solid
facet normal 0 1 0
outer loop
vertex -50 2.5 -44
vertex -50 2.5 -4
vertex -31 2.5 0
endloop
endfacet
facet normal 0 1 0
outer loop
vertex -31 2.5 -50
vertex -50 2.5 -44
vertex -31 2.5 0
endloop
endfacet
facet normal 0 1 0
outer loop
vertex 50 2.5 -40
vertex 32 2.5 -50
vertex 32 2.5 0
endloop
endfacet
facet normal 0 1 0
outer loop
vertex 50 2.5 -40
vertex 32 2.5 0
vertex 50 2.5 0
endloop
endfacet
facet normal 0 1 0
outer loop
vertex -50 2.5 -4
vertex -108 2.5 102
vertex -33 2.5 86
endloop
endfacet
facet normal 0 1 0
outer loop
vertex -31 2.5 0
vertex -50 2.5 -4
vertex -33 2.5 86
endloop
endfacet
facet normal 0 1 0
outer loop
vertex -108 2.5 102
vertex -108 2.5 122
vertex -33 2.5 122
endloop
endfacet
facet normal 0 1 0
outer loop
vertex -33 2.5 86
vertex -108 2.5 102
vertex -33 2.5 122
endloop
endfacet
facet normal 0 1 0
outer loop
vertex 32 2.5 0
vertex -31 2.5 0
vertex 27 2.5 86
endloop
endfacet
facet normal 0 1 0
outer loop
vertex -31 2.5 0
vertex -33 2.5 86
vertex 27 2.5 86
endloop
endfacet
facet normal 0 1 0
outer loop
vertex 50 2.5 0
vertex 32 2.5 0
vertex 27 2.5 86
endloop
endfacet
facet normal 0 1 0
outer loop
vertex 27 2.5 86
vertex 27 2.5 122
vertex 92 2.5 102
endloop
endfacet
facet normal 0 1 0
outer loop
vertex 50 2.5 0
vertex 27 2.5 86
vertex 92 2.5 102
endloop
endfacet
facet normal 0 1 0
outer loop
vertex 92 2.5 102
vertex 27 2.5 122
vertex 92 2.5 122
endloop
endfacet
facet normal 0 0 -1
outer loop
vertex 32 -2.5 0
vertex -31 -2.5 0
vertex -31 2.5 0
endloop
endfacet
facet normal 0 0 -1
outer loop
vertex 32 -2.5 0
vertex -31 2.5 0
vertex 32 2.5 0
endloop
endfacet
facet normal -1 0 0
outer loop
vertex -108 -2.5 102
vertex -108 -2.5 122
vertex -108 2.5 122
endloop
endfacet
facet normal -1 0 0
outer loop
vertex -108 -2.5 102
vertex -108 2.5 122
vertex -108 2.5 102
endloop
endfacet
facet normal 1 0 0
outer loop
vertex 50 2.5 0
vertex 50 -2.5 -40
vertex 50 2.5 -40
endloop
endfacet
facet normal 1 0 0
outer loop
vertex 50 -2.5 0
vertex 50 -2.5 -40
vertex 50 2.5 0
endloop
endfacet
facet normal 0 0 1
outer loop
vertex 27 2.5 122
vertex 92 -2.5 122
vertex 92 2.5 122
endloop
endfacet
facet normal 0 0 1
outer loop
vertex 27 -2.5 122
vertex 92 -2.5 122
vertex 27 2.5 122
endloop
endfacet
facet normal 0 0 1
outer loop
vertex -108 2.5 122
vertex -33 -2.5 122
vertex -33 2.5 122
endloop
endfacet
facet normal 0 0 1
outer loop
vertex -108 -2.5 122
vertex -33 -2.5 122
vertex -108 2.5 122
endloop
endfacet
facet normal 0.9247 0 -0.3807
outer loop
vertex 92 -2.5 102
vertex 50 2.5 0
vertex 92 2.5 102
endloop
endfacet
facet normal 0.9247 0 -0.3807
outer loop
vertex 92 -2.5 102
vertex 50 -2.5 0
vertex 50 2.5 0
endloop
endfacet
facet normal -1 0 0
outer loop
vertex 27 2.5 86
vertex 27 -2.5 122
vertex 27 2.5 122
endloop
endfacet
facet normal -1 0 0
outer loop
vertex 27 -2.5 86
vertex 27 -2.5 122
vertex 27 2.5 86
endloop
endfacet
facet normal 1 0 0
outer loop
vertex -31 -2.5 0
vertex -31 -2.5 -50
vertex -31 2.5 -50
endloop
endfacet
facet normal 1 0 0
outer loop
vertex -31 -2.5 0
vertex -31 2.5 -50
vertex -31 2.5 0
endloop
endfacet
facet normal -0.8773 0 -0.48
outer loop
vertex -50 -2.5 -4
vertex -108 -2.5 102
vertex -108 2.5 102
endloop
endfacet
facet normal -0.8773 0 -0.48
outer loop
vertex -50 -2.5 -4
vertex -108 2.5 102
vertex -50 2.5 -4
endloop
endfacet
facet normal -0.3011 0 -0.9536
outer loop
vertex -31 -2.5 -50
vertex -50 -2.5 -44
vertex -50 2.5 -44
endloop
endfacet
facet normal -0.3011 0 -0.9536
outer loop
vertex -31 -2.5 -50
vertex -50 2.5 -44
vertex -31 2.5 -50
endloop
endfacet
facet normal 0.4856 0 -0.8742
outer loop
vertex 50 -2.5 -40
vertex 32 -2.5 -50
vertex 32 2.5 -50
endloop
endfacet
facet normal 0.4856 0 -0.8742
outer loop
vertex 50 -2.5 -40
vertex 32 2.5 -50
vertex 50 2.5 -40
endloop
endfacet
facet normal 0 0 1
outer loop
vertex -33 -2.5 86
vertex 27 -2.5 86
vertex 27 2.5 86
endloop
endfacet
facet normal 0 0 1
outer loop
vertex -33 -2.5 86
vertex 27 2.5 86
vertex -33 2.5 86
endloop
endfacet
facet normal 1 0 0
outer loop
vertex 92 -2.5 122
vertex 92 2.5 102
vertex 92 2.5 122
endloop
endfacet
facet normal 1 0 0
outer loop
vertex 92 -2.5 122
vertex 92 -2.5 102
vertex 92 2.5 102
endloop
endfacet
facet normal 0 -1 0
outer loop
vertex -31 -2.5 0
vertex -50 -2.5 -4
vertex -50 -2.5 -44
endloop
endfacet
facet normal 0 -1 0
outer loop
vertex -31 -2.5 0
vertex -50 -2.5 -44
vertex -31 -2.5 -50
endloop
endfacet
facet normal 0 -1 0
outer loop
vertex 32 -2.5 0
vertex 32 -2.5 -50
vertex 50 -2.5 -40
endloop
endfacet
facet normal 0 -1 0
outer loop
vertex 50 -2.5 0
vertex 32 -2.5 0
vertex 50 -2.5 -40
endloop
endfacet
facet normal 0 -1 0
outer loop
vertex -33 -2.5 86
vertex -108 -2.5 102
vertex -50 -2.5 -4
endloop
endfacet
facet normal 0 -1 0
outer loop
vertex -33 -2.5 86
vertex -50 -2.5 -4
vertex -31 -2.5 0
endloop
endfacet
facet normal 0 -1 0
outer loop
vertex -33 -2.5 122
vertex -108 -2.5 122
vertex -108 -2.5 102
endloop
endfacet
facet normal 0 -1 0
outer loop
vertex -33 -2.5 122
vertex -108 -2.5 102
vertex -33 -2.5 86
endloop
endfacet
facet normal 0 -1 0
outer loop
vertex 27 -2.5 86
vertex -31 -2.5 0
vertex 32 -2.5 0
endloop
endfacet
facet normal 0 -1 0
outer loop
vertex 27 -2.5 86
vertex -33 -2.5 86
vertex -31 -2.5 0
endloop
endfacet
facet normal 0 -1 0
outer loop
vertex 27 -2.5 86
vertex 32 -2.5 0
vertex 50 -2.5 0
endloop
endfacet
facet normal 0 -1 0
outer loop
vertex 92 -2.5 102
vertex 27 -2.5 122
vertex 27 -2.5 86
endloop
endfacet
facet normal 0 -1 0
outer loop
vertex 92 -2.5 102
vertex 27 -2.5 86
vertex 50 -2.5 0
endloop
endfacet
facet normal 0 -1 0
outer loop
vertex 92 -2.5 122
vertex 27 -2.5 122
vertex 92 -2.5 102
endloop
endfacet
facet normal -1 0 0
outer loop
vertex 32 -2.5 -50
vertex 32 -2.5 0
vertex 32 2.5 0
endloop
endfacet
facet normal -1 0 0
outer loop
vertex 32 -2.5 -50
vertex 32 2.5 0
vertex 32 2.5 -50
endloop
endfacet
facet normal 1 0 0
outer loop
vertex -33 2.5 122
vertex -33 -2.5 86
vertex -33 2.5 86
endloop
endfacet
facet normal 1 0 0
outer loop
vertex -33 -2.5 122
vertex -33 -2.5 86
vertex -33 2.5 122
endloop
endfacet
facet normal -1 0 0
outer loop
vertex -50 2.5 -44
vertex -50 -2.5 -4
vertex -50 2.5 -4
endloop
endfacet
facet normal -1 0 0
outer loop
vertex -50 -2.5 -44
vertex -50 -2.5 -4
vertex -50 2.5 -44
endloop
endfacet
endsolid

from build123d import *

# Parameters (mm, degrees)
F1_DEPTH = 2.5


# Not quite as in the source:
# - a feature names something its author has since deleted; it is built from what else it names


with BuildPart() as f1:
    # F0 (on Front) → F1 (new body, symmetric)
    with BuildSketch(Plane.XZ):
        Polygon((92, 102), (92, 122), (27, 122), (27, 86), (-33, 86), (-33, 122), (-108, 122), (-108, 102), (-50, -4), (-50, -44), (-31, -50), (-31, 0), (0, 0), (32, 0), (32, -50), (49.9996958359, -40.0000051003), (49.9996958359, -5.1003e-06), align=None)
    extrude(amount=F1_DEPTH, both=True)


solid = f1.part
